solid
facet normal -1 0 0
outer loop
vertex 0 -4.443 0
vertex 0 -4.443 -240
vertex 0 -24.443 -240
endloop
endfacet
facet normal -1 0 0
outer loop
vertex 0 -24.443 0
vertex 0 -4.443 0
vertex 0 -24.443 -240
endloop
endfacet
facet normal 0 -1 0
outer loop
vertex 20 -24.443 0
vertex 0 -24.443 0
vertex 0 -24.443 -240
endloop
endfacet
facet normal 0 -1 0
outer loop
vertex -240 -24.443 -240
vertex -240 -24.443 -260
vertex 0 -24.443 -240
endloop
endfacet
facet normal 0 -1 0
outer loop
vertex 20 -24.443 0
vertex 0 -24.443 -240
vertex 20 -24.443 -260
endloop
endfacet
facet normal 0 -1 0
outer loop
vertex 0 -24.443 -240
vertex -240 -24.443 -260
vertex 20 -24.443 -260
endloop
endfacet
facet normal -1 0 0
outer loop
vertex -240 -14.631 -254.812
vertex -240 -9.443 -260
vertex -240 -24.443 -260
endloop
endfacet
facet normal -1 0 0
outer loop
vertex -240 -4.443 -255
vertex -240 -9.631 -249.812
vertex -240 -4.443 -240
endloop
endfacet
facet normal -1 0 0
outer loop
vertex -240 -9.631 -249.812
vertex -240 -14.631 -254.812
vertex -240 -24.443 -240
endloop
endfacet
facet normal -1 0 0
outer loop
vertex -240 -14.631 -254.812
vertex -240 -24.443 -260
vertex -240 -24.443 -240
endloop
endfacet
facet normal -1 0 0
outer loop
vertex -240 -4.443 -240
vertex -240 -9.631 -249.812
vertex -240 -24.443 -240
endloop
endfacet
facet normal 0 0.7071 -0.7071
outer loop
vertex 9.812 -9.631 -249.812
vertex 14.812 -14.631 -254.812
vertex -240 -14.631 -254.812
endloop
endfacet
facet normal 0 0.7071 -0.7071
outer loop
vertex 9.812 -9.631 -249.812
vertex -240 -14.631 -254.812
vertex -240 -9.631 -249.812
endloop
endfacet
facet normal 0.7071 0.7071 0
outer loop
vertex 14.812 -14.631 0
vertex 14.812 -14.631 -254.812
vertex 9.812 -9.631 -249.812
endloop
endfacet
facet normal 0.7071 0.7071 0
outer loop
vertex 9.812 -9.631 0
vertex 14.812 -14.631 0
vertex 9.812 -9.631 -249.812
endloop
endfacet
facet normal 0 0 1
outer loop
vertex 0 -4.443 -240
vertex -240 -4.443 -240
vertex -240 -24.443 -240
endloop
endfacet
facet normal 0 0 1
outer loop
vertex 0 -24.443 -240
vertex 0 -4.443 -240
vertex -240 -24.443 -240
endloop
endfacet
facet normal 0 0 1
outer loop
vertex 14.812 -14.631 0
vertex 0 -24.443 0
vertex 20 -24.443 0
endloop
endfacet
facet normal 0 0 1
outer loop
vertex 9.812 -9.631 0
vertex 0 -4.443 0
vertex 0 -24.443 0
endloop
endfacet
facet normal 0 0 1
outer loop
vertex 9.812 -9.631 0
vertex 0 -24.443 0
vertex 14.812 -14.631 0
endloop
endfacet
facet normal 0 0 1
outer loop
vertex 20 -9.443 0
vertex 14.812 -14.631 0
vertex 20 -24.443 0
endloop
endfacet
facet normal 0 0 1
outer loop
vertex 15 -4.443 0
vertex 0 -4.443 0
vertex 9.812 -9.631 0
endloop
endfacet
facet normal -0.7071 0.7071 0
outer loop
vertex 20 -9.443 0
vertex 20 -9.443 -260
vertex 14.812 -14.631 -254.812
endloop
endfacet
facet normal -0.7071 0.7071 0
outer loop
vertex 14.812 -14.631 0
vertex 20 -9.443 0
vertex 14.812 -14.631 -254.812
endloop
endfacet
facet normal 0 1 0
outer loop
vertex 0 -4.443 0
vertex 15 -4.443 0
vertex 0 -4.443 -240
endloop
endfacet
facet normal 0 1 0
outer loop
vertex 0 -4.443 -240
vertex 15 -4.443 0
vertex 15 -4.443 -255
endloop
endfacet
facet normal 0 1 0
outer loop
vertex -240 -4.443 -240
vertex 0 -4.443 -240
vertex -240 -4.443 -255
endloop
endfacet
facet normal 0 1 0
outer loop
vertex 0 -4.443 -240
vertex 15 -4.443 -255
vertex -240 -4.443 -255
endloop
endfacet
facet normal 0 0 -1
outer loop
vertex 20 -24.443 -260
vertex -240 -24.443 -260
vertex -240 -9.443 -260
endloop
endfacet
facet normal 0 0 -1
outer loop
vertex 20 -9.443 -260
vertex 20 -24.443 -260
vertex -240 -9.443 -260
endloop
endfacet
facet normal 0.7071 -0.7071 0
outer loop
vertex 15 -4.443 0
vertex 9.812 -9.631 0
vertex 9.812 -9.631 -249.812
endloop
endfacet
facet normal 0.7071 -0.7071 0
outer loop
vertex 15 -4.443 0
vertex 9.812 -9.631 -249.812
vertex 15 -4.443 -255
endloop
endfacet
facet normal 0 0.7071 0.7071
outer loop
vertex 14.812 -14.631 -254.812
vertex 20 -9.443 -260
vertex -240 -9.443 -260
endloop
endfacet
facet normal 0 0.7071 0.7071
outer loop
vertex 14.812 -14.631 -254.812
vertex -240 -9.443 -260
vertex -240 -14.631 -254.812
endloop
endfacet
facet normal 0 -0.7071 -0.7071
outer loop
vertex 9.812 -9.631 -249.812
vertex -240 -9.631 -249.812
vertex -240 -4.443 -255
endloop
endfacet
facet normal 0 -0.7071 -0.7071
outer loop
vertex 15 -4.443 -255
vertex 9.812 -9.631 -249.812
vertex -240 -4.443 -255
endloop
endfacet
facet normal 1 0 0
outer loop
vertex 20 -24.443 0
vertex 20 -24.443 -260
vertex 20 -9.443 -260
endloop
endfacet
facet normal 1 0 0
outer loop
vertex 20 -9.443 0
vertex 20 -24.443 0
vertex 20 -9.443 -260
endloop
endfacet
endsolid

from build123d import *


with BuildPart() as part:
    # Sweep2: sweep along a path in Sketch4
    with BuildLine(Plane(origin=(0, 0, 0), x_dir=(1, 0, 0), z_dir=(0, 1, 0))) as sweep2_path:
        Line((0, 0), (0, 240))
        Line((0, 240), (-240, 240))
    # Sketch3 → Sweep2 (sweep)
    with BuildSketch(Plane.XY):
        Polygon((0, -4.442807786), (0, -24.442807786), (20, -24.442807786), (20, -9.442807786), (14.811670364, -14.631137422), (9.811670364, -9.631137422), (15, -4.442807786), align=None)
    sweep(path=sweep2_path.line, transition=Transition.RIGHT)


solid = part.part
